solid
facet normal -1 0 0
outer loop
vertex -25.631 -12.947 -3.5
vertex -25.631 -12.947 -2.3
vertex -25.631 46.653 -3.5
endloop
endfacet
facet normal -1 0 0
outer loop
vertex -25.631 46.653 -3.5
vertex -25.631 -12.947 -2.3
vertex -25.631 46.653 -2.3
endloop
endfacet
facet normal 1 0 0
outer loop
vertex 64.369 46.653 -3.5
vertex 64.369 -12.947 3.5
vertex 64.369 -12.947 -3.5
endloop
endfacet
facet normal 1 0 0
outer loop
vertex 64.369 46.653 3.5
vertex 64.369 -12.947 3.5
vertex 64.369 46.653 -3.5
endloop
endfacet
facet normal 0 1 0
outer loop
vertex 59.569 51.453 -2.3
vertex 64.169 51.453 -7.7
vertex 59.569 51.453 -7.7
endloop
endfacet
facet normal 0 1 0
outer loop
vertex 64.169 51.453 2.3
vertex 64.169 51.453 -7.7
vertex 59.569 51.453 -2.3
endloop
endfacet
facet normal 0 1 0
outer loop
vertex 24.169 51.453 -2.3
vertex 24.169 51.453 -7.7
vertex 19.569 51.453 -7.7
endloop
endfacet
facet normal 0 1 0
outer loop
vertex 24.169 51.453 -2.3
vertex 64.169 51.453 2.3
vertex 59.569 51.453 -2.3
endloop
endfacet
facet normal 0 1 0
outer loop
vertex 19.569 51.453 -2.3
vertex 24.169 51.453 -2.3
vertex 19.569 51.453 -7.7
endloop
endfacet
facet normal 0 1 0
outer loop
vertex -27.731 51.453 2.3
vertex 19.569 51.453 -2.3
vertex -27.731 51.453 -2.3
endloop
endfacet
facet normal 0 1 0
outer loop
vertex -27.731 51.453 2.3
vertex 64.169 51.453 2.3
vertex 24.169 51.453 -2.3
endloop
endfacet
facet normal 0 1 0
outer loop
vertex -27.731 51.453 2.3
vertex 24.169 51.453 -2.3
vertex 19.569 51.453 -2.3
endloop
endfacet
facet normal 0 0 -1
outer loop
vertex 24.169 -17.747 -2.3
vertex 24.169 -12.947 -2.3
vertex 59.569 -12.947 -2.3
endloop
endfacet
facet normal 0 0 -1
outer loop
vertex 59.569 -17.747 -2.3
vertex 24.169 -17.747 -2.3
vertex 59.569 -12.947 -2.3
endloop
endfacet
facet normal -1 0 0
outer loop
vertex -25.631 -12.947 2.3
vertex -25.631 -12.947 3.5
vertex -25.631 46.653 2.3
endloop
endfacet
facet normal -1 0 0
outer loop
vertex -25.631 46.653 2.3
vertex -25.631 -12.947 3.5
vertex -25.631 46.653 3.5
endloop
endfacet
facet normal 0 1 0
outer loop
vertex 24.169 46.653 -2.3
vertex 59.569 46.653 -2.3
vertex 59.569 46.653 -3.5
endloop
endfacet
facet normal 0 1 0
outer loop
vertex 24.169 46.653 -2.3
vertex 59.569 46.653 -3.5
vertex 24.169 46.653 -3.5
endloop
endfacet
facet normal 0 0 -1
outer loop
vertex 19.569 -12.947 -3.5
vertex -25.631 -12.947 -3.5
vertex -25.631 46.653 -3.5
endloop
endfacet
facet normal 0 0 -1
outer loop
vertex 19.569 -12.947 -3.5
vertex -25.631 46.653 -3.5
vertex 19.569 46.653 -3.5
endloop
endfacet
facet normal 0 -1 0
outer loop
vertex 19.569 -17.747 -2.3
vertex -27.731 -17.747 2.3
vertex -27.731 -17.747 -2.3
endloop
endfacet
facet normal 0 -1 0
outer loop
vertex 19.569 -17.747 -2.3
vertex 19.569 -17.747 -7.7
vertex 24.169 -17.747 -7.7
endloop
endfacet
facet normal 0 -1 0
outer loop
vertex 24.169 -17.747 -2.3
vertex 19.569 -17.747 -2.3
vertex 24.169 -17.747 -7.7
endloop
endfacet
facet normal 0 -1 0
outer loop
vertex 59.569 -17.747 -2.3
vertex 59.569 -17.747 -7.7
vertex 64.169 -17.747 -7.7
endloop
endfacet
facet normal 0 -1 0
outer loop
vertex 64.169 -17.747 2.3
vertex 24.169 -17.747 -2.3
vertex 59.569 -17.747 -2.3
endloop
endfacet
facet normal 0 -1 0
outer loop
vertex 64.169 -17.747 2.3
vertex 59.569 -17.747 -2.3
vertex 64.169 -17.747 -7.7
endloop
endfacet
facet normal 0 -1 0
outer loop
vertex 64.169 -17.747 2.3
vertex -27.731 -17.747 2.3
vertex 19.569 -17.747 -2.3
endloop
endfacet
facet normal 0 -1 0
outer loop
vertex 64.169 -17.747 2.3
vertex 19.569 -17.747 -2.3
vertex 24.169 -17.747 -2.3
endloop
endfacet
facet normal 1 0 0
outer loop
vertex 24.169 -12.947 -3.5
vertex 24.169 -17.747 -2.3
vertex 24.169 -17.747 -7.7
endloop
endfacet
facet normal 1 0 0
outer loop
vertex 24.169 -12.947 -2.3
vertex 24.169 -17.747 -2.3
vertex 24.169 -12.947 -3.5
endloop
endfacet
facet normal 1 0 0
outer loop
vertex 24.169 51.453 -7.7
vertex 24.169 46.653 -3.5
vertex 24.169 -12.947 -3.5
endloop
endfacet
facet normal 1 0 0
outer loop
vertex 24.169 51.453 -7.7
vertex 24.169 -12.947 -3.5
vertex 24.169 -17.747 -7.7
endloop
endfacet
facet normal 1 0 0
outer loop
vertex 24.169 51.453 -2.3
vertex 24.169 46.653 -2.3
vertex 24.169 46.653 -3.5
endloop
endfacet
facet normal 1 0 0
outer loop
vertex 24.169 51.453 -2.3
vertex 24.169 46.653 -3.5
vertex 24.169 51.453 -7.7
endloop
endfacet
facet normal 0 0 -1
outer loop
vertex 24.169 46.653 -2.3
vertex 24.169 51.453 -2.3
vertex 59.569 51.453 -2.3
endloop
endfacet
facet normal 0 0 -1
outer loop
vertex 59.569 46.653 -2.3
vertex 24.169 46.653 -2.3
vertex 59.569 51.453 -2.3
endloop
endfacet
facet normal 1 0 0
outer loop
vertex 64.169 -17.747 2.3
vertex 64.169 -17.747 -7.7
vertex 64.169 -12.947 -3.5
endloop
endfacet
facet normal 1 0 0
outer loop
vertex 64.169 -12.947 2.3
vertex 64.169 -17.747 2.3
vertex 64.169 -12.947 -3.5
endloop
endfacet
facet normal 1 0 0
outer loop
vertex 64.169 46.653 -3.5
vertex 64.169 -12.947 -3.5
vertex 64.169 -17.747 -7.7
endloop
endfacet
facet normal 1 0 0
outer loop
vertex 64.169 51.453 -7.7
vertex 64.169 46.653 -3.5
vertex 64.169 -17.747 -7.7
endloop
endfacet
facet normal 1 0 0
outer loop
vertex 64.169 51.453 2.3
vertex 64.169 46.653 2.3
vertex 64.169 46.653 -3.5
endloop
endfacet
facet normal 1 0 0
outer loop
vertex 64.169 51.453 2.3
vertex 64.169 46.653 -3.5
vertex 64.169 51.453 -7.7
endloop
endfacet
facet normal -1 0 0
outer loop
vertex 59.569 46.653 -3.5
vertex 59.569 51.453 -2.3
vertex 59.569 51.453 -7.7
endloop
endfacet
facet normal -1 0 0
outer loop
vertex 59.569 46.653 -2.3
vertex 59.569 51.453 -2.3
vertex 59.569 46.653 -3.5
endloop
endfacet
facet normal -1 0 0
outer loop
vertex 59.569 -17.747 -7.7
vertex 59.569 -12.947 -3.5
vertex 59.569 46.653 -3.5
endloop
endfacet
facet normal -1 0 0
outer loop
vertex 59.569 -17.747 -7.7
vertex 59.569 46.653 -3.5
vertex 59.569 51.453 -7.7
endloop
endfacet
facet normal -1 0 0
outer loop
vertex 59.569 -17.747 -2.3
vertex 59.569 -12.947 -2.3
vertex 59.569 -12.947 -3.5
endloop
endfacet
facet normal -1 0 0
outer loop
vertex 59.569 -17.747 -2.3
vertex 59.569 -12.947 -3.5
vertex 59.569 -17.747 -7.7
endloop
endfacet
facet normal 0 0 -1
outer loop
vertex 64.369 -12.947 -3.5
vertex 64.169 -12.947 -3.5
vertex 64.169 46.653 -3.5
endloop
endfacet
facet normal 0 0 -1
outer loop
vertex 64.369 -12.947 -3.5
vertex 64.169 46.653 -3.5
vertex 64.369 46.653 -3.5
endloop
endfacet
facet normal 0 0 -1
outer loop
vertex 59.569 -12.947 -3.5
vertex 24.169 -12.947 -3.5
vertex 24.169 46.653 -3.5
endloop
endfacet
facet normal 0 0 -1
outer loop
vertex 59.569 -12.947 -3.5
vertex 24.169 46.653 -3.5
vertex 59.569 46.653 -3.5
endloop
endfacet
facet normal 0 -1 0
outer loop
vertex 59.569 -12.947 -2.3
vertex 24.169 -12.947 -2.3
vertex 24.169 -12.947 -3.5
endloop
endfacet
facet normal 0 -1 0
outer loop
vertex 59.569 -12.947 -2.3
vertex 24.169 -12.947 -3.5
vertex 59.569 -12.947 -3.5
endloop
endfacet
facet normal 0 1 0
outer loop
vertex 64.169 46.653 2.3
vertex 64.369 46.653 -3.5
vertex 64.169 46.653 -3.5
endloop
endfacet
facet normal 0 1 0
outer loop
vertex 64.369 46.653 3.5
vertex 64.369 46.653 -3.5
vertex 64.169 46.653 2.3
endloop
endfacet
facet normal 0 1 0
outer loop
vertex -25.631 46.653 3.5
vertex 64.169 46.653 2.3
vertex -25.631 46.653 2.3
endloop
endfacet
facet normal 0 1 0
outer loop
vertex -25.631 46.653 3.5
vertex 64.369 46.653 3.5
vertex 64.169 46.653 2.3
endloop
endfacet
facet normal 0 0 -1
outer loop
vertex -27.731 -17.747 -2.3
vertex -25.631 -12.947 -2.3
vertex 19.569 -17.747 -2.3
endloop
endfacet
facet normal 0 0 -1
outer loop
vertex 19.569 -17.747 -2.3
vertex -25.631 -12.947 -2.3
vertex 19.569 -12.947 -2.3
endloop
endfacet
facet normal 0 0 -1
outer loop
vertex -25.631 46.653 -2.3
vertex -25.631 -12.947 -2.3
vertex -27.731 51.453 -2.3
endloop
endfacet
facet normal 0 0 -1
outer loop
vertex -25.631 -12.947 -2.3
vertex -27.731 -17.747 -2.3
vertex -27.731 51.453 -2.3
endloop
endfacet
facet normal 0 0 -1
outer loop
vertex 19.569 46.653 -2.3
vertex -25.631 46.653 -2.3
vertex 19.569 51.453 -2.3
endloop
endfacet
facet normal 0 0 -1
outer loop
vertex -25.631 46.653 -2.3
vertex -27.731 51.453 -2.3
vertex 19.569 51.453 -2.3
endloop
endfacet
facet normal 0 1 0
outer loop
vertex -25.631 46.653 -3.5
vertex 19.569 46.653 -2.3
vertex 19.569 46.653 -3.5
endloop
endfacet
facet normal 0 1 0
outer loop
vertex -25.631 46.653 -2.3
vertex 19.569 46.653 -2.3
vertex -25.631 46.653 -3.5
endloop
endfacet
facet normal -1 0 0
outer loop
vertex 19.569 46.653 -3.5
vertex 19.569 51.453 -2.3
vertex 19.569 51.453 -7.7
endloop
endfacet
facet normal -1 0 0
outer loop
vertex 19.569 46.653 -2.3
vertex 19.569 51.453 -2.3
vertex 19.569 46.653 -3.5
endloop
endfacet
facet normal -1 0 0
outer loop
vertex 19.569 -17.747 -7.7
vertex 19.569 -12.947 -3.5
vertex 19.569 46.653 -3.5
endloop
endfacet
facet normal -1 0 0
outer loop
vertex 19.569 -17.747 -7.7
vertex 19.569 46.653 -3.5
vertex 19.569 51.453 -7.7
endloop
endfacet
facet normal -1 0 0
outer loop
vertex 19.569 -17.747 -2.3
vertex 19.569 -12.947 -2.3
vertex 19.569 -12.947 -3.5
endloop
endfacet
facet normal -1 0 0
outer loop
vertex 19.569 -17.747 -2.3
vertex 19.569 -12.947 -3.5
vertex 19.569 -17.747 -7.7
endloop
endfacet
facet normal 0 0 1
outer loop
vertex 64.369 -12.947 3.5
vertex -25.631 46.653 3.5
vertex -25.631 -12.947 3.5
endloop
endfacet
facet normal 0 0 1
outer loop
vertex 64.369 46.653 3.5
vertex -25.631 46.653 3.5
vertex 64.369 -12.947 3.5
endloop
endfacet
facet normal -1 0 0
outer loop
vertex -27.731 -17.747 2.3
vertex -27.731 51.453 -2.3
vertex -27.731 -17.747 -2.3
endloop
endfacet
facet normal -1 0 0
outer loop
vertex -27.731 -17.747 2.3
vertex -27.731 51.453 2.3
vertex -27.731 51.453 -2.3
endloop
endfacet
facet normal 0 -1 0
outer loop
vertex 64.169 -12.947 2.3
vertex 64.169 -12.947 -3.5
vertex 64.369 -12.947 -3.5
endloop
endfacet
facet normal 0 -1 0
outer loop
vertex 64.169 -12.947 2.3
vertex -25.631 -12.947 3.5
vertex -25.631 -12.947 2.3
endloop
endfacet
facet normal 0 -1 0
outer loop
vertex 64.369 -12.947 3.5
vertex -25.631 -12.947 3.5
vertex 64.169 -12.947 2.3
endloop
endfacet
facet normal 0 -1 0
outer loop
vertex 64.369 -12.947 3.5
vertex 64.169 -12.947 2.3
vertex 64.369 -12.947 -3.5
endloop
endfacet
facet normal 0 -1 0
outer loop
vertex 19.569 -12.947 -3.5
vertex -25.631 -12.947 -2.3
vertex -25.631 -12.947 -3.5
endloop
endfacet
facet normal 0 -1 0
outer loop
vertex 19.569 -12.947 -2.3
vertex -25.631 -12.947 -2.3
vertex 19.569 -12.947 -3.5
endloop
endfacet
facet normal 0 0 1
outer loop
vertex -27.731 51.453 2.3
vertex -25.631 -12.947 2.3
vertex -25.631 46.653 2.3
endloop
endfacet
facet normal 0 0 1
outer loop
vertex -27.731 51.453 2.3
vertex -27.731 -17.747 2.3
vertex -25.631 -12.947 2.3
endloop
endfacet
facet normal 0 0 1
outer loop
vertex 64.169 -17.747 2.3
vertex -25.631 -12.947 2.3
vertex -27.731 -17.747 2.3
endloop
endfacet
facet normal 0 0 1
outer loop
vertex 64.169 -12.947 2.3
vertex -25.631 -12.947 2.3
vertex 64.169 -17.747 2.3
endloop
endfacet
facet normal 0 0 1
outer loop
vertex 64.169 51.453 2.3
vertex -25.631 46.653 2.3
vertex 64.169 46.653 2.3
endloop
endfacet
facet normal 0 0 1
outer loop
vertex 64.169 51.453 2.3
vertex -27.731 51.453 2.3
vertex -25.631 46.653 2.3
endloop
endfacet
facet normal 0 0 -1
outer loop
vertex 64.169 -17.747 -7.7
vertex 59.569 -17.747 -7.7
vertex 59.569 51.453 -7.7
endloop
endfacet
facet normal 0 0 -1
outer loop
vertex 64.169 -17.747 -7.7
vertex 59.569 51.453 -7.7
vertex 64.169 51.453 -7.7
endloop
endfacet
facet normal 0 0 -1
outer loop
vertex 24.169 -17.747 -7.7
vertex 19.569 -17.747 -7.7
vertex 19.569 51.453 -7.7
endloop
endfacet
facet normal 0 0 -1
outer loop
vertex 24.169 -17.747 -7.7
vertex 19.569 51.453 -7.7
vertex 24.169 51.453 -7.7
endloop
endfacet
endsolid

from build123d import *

# Parameters (mm, degrees)
F0_W     = 4.6
F0_H     = 4.8
F0_W_2   = 35.4
F1_DEPTH = 2.3
F0_W_3   = 45.2
F0_H_2   = 59.6
F0_W_4   = 0.2
F2_DEPTH = 3.5
F3_DEPTH = 7.7


with BuildPart() as f1:
    # F0 (on Top) → F1 (new body, symmetric)
    with BuildSketch(Plane.XY):
        Polygon((19.5689408898, 51.453421098), (-27.7310591102, 51.453421098), (-27.7310591102, -17.746578902), (19.5689408898, -17.746578902), (19.5689408898, -12.946578902), (-25.6310591102, -12.946578902), (-25.6310591102, 46.653421098), (19.5689408898, 46.653421098), align=None)
        with Locations((21.8689408898, 49.053421098)):
            Rectangle(F0_W, F0_H)
        with Locations((41.8689408898, 49.053421098)):
            Rectangle(F0_W_2, F0_H)
        with Locations((61.8689408898, 49.053421098)):
            Rectangle(F0_W, F0_H)
        with Locations((21.8689408898, -15.346578902)):
            Rectangle(F0_W, F0_H)
        with Locations((41.8689408898, -15.346578902)):
            Rectangle(F0_W_2, F0_H)
        with Locations((61.8689408898, -15.346578902)):
            Rectangle(F0_W, F0_H)
    extrude(amount=F1_DEPTH, both=True)

    # F0 (on Top) → F2 (join, symmetric)
    with BuildSketch(Plane.XY):
        with Locations((-3.0310591102, 16.853421098)):
            Rectangle(F0_W_3, F0_H_2)
        with Locations((21.8689408898, 16.853421098)):
            Rectangle(F0_W, F0_H_2)
        with Locations((41.8689408898, 16.853421098)):
            Rectangle(F0_W_2, F0_H_2)
        with Locations((61.8689408898, 16.853421098)):
            Rectangle(F0_W, F0_H_2)
        with Locations((64.2689408898, 16.853421098)):
            Rectangle(F0_W_4, F0_H_2)
    extrude(amount=F2_DEPTH, both=True)

    # F0 (on Top) → F3 (join)
    with BuildSketch(Plane.XY):
        with Locations((21.8689408898, 16.853421098)):
            Rectangle(F0_W, F0_H_2)
        with Locations((21.8689408898, 49.053421098)):
            Rectangle(F0_W, F0_H)
        with Locations((21.8689408898, -15.346578902)):
            Rectangle(F0_W, F0_H)
        with Locations((61.8689408898, -15.346578902)):
            Rectangle(F0_W, F0_H)
        with Locations((61.8689408898, 16.853421098)):
            Rectangle(F0_W, F0_H_2)
        with Locations((61.8689408898, 49.053421098)):
            Rectangle(F0_W, F0_H)
    extrude(amount=-F3_DEPTH)


solid = f1.part
